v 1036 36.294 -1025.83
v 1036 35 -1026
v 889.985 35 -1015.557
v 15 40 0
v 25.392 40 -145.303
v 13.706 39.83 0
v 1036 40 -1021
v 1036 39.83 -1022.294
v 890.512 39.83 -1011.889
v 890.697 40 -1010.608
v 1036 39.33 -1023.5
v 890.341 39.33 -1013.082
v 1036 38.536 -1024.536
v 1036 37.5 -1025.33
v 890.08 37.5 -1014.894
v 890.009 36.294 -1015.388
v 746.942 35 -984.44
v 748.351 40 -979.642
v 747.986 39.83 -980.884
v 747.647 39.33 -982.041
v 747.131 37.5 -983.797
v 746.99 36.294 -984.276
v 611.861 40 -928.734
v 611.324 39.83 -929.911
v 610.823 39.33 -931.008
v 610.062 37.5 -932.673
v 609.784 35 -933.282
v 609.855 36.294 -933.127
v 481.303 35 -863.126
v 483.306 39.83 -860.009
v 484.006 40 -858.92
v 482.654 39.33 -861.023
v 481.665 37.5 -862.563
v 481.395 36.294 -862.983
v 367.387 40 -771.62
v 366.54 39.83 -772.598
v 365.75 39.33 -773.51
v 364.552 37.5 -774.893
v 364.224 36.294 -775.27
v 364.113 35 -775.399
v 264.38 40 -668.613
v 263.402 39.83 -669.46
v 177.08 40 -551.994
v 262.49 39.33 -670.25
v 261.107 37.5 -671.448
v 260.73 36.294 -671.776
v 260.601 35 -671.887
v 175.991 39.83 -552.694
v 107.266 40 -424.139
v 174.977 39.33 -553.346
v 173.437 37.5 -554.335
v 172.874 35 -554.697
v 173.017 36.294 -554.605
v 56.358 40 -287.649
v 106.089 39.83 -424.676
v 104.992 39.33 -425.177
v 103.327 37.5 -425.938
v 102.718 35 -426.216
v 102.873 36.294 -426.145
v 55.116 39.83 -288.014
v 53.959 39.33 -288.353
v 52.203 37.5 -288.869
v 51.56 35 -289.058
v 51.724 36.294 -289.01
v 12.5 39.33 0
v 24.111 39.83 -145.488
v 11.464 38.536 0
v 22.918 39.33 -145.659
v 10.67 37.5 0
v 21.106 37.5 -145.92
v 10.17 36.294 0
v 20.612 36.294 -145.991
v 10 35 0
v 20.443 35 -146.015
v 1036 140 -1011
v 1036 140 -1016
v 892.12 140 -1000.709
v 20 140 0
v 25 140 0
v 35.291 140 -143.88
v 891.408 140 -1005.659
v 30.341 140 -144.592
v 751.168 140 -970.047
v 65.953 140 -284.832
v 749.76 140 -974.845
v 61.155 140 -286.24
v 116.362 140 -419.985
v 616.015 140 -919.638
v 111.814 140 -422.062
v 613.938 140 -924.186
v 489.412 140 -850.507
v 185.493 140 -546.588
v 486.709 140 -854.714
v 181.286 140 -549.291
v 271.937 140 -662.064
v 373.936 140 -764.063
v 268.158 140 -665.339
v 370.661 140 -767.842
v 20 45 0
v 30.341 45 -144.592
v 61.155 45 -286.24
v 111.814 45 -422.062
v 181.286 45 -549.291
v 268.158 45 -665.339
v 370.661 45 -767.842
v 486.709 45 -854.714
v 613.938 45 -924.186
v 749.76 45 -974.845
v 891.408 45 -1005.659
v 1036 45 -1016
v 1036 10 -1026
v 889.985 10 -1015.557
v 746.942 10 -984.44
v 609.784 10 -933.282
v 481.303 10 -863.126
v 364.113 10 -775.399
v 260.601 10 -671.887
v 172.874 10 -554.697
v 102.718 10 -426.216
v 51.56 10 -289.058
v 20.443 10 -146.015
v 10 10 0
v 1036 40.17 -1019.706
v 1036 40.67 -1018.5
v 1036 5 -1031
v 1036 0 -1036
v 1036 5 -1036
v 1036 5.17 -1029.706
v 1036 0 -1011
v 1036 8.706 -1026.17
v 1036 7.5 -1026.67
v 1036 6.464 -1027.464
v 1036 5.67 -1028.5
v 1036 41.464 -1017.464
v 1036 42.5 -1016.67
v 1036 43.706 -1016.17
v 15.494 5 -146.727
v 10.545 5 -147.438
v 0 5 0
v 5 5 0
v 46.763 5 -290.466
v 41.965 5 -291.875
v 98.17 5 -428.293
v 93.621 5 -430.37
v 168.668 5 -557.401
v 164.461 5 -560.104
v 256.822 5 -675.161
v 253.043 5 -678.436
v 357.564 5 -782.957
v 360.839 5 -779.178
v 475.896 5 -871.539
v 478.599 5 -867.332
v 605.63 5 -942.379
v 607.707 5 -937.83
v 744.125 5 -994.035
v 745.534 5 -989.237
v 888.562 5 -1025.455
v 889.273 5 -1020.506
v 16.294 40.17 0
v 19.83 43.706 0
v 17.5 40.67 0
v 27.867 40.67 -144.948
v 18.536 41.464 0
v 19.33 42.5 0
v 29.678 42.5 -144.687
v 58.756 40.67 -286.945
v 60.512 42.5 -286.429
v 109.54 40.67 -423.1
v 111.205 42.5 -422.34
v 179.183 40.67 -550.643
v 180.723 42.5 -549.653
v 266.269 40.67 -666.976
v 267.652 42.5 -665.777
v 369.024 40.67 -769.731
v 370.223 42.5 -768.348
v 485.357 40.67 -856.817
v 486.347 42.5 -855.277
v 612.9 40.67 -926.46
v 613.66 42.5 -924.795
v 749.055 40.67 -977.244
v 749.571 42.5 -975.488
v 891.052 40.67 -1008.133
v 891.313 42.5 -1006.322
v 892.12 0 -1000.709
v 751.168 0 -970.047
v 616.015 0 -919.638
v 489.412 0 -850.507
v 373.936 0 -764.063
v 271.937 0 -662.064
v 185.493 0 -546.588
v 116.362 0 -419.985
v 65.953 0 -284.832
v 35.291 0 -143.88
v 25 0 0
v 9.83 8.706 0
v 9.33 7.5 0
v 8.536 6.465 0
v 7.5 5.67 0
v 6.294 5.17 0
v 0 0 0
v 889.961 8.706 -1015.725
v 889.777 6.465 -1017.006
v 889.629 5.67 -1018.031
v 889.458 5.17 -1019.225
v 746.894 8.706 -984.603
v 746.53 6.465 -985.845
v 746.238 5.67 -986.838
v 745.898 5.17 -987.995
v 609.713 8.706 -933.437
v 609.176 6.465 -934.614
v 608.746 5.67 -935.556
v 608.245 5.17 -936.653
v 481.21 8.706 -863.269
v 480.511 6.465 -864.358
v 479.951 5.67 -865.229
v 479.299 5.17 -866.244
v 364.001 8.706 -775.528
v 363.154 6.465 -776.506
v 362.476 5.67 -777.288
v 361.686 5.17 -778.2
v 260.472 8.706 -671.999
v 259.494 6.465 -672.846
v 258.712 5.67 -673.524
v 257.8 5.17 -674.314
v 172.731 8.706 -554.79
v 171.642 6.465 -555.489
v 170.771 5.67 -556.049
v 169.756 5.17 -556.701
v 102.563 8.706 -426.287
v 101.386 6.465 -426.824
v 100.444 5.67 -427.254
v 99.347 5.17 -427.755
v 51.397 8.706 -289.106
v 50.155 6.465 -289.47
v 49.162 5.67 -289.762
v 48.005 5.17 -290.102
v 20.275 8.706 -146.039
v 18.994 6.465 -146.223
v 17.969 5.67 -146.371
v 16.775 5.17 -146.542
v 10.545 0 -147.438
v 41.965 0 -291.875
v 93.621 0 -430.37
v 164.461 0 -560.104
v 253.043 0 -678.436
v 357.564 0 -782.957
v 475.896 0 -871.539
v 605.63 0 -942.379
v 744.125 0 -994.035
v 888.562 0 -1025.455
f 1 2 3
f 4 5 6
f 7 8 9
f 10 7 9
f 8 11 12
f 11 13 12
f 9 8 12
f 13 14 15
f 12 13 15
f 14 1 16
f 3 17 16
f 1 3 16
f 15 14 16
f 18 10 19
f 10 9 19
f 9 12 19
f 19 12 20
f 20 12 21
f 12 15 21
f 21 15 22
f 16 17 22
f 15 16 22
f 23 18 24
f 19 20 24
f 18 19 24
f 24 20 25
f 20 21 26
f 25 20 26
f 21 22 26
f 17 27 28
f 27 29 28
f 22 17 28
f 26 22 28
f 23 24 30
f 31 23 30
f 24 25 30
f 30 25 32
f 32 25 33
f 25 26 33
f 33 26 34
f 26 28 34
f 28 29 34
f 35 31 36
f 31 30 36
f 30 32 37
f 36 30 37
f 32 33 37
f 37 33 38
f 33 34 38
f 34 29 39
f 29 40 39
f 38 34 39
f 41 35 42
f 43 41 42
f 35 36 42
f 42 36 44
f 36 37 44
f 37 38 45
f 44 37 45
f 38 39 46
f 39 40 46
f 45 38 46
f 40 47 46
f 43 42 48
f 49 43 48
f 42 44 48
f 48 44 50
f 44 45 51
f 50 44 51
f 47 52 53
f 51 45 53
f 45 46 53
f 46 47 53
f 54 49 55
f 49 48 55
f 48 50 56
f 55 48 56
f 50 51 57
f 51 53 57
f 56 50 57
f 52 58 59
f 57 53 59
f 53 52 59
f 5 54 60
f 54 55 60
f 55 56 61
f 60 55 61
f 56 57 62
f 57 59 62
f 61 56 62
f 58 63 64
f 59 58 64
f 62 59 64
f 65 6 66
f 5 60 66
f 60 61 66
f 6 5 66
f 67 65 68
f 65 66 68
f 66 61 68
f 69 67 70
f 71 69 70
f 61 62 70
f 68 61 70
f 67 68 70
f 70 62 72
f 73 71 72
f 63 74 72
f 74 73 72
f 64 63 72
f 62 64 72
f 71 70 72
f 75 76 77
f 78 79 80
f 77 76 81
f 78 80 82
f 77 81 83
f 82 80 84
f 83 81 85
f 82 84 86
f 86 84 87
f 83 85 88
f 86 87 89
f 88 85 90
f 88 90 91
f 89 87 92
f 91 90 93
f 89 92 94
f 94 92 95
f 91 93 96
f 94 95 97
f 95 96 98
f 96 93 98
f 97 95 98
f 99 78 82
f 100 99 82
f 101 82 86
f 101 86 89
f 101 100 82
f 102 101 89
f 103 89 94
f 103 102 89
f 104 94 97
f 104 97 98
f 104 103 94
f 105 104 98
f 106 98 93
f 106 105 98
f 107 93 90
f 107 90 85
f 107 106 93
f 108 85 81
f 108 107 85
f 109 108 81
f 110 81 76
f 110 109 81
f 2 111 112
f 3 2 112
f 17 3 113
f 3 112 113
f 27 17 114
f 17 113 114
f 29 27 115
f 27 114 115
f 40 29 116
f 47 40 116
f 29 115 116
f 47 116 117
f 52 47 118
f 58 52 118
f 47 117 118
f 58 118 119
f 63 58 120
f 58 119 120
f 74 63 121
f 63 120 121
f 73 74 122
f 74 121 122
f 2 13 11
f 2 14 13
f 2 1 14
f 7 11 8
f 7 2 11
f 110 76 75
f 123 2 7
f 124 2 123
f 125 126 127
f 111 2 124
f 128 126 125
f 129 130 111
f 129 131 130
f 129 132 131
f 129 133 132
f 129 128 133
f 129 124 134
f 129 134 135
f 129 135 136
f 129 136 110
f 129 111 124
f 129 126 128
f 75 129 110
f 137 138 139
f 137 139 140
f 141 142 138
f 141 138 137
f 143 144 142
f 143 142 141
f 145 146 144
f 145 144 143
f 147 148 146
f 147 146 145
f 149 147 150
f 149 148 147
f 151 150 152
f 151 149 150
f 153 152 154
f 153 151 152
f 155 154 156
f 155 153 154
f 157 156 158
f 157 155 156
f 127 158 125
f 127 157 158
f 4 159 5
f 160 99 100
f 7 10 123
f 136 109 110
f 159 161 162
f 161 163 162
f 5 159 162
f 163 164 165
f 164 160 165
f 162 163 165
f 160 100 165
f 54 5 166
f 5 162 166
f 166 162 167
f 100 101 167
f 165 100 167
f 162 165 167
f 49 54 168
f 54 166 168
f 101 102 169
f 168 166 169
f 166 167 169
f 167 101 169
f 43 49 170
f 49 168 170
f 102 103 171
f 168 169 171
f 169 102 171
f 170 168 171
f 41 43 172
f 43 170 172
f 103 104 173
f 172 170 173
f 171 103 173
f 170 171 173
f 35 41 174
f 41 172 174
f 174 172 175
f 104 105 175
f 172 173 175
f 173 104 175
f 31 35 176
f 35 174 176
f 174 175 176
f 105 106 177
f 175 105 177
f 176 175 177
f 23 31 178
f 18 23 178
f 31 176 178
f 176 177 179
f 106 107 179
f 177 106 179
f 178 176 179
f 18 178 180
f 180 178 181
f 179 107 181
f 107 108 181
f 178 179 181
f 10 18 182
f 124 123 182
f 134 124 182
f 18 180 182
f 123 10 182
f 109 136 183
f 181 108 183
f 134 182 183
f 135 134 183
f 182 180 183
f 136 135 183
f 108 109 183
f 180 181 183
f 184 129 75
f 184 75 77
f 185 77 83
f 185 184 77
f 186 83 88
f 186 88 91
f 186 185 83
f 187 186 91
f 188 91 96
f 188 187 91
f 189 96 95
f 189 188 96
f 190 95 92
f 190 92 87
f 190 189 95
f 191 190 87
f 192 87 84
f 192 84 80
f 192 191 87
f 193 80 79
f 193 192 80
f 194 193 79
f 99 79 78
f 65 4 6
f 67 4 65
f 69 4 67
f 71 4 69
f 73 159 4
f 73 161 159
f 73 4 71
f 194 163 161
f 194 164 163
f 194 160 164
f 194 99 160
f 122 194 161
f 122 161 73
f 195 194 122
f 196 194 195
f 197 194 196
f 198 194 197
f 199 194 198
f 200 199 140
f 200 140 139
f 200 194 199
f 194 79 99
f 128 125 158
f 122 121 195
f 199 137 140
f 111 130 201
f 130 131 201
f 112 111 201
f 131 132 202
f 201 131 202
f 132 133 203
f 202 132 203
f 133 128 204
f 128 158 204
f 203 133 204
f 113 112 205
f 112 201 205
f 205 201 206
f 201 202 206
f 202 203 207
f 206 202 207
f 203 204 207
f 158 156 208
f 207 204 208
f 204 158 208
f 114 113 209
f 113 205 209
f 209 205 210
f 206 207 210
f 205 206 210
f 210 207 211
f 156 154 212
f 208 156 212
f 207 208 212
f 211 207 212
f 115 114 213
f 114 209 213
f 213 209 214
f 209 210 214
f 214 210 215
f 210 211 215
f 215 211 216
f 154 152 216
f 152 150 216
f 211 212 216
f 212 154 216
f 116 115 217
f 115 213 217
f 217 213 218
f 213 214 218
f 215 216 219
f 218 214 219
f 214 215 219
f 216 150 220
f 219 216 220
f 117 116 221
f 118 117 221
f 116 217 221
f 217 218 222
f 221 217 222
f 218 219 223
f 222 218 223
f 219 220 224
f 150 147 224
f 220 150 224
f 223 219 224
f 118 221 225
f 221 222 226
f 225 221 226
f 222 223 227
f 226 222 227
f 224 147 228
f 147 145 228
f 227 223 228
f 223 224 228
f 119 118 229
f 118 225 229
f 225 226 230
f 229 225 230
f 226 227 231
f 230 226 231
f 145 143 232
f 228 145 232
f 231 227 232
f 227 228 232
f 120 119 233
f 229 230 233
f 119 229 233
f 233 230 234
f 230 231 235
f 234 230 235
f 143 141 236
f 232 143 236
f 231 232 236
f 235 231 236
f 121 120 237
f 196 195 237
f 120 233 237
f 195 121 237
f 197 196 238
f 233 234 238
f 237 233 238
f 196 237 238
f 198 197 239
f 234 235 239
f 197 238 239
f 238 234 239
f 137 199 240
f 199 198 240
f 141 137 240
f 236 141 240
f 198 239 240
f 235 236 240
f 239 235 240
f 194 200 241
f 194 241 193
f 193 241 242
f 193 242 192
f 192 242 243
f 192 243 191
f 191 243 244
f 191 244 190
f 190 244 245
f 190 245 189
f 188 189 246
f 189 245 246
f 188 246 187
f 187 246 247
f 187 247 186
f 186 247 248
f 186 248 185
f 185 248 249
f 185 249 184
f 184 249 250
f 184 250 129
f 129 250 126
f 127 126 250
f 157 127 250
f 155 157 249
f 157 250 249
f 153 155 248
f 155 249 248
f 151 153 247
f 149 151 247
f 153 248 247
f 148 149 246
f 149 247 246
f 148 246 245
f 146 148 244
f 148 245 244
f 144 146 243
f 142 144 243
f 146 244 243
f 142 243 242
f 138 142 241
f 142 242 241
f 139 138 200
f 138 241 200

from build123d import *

# Parameters (mm, degrees)
BOTTOM_LEVEL_DEPTH = 5
MID_LEVEL_DEPTH    = 35
GUARD_RAIL_DEPTH   = 100
ROUNDING_R         = 5


with BuildPart() as part:
    # Sketch1 → Bottom level (new body)
    with BuildSketch(Plane(origin=(0, 0, 0), x_dir=(1, 0, 0), z_dir=(0, 1, 0))):
        with BuildLine():
            Line((0, 0), (25, 0))
            ThreePointArc((25, 0), (321.11504422, 714.88495578), (1036, 1011))
            Line((1036, 1011), (1036, 1036))
            ThreePointArc((1036, 1036), (303.437374691, 732.562625309), (0, 0))
        make_face()
    extrude(amount=BOTTOM_LEVEL_DEPTH)

    # Sketch2 → Mid level (add)
    with BuildSketch(Plane(origin=(0, 5, 0), x_dir=(1, 0, 0), z_dir=(0, 1, 0))):
        with BuildLine():
            Line((1036, 1011), (1036, 1026))
            ThreePointArc((1036, 1026), (310.508442503, 725.491557497), (10, 0))
            Line((10, 0), (25, 0))
            ThreePointArc((25, 0), (321.11504422, 714.88495578), (1036, 1011))
        make_face()
    extrude(amount=MID_LEVEL_DEPTH)

    # Sketch3 → Guard rail (add)
    with BuildSketch(Plane(origin=(0, 40, 0), x_dir=(1, 0, 0), z_dir=(0, 1, 0))):
        with BuildLine():
            Line((1036, 1016), (1036, 1011))
            ThreePointArc((1036, 1011), (321.11504422, 714.88495578), (25, 0))
            Line((25, 0), (20, 0))
            ThreePointArc((20, 0), (317.579510314, 718.420489686), (1036, 1016))
        make_face()
    extrude(amount=GUARD_RAIL_DEPTH)

    # Rounding
    rounding_edges = [part.edges().sort_by_distance(p)[0] for p in [
        (317.579510314, 40, -718.420489686),
        (310.508442503, 40, -725.491557497),
        (310.508442503, 5, -725.491557497),
    ]]
    fillet(rounding_edges, radius=ROUNDING_R - 0.0001)  # a hair under: the kernel refuses the full size


solid = part.part
